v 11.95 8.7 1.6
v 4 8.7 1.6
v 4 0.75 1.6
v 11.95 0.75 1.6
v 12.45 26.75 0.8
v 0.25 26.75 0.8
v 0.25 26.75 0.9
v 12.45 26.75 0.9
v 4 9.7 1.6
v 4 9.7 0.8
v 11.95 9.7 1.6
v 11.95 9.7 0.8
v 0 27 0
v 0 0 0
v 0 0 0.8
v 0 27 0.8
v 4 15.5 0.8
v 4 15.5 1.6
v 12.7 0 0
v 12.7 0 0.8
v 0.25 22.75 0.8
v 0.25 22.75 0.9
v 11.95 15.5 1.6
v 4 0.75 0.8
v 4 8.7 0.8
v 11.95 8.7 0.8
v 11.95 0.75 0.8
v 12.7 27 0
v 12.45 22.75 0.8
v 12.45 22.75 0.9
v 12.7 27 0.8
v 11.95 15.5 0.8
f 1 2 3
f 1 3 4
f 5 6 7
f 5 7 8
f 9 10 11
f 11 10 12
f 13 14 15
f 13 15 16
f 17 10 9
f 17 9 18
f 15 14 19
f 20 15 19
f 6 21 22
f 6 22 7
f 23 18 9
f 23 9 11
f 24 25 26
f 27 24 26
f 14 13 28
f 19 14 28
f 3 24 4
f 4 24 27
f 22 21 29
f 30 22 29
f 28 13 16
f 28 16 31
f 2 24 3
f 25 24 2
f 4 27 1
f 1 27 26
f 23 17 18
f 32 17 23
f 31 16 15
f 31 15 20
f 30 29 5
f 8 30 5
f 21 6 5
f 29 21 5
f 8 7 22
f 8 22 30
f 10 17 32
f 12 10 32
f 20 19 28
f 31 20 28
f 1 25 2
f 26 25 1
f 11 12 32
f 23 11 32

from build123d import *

# Parameters (mm, degrees)
F0_W     = 12.7
F0_H     = 27
F1_DEPTH = 0.8
F2_W     = 7.95
F2_H     = 7.95
F2_H_2   = 5.8
F3_DEPTH = 0.8
F4_W     = 12.2
F4_H     = 4
F5_DEPTH = 0.1


with BuildPart() as f1:
    # F0 (on Top) → F1 (new body)
    with BuildSketch(Plane.XY):
        with Locations((6.35, 13.5)):
            Rectangle(F0_W, F0_H)
    extrude(amount=F1_DEPTH)


with BuildPart() as f3:
    # F2 (on face) → F3 (new body)
    with BuildSketch(Plane.XY.offset(0.8)):
        with Locations((7.975, 4.725)):
            Rectangle(F2_W, F2_H)
        with Locations((7.975, 12.6)):
            Rectangle(F2_W, F2_H_2)
    extrude(amount=F3_DEPTH)


with BuildPart() as f5:
    # F4 (on face) → F5 (new body)
    with BuildSketch(Plane.XY.offset(0.8)):
        with Locations((6.35, 24.75)):
            Rectangle(F4_W, F4_H)
    extrude(amount=F5_DEPTH)


solid = Compound([f1.part, f3.part, f5.part])
